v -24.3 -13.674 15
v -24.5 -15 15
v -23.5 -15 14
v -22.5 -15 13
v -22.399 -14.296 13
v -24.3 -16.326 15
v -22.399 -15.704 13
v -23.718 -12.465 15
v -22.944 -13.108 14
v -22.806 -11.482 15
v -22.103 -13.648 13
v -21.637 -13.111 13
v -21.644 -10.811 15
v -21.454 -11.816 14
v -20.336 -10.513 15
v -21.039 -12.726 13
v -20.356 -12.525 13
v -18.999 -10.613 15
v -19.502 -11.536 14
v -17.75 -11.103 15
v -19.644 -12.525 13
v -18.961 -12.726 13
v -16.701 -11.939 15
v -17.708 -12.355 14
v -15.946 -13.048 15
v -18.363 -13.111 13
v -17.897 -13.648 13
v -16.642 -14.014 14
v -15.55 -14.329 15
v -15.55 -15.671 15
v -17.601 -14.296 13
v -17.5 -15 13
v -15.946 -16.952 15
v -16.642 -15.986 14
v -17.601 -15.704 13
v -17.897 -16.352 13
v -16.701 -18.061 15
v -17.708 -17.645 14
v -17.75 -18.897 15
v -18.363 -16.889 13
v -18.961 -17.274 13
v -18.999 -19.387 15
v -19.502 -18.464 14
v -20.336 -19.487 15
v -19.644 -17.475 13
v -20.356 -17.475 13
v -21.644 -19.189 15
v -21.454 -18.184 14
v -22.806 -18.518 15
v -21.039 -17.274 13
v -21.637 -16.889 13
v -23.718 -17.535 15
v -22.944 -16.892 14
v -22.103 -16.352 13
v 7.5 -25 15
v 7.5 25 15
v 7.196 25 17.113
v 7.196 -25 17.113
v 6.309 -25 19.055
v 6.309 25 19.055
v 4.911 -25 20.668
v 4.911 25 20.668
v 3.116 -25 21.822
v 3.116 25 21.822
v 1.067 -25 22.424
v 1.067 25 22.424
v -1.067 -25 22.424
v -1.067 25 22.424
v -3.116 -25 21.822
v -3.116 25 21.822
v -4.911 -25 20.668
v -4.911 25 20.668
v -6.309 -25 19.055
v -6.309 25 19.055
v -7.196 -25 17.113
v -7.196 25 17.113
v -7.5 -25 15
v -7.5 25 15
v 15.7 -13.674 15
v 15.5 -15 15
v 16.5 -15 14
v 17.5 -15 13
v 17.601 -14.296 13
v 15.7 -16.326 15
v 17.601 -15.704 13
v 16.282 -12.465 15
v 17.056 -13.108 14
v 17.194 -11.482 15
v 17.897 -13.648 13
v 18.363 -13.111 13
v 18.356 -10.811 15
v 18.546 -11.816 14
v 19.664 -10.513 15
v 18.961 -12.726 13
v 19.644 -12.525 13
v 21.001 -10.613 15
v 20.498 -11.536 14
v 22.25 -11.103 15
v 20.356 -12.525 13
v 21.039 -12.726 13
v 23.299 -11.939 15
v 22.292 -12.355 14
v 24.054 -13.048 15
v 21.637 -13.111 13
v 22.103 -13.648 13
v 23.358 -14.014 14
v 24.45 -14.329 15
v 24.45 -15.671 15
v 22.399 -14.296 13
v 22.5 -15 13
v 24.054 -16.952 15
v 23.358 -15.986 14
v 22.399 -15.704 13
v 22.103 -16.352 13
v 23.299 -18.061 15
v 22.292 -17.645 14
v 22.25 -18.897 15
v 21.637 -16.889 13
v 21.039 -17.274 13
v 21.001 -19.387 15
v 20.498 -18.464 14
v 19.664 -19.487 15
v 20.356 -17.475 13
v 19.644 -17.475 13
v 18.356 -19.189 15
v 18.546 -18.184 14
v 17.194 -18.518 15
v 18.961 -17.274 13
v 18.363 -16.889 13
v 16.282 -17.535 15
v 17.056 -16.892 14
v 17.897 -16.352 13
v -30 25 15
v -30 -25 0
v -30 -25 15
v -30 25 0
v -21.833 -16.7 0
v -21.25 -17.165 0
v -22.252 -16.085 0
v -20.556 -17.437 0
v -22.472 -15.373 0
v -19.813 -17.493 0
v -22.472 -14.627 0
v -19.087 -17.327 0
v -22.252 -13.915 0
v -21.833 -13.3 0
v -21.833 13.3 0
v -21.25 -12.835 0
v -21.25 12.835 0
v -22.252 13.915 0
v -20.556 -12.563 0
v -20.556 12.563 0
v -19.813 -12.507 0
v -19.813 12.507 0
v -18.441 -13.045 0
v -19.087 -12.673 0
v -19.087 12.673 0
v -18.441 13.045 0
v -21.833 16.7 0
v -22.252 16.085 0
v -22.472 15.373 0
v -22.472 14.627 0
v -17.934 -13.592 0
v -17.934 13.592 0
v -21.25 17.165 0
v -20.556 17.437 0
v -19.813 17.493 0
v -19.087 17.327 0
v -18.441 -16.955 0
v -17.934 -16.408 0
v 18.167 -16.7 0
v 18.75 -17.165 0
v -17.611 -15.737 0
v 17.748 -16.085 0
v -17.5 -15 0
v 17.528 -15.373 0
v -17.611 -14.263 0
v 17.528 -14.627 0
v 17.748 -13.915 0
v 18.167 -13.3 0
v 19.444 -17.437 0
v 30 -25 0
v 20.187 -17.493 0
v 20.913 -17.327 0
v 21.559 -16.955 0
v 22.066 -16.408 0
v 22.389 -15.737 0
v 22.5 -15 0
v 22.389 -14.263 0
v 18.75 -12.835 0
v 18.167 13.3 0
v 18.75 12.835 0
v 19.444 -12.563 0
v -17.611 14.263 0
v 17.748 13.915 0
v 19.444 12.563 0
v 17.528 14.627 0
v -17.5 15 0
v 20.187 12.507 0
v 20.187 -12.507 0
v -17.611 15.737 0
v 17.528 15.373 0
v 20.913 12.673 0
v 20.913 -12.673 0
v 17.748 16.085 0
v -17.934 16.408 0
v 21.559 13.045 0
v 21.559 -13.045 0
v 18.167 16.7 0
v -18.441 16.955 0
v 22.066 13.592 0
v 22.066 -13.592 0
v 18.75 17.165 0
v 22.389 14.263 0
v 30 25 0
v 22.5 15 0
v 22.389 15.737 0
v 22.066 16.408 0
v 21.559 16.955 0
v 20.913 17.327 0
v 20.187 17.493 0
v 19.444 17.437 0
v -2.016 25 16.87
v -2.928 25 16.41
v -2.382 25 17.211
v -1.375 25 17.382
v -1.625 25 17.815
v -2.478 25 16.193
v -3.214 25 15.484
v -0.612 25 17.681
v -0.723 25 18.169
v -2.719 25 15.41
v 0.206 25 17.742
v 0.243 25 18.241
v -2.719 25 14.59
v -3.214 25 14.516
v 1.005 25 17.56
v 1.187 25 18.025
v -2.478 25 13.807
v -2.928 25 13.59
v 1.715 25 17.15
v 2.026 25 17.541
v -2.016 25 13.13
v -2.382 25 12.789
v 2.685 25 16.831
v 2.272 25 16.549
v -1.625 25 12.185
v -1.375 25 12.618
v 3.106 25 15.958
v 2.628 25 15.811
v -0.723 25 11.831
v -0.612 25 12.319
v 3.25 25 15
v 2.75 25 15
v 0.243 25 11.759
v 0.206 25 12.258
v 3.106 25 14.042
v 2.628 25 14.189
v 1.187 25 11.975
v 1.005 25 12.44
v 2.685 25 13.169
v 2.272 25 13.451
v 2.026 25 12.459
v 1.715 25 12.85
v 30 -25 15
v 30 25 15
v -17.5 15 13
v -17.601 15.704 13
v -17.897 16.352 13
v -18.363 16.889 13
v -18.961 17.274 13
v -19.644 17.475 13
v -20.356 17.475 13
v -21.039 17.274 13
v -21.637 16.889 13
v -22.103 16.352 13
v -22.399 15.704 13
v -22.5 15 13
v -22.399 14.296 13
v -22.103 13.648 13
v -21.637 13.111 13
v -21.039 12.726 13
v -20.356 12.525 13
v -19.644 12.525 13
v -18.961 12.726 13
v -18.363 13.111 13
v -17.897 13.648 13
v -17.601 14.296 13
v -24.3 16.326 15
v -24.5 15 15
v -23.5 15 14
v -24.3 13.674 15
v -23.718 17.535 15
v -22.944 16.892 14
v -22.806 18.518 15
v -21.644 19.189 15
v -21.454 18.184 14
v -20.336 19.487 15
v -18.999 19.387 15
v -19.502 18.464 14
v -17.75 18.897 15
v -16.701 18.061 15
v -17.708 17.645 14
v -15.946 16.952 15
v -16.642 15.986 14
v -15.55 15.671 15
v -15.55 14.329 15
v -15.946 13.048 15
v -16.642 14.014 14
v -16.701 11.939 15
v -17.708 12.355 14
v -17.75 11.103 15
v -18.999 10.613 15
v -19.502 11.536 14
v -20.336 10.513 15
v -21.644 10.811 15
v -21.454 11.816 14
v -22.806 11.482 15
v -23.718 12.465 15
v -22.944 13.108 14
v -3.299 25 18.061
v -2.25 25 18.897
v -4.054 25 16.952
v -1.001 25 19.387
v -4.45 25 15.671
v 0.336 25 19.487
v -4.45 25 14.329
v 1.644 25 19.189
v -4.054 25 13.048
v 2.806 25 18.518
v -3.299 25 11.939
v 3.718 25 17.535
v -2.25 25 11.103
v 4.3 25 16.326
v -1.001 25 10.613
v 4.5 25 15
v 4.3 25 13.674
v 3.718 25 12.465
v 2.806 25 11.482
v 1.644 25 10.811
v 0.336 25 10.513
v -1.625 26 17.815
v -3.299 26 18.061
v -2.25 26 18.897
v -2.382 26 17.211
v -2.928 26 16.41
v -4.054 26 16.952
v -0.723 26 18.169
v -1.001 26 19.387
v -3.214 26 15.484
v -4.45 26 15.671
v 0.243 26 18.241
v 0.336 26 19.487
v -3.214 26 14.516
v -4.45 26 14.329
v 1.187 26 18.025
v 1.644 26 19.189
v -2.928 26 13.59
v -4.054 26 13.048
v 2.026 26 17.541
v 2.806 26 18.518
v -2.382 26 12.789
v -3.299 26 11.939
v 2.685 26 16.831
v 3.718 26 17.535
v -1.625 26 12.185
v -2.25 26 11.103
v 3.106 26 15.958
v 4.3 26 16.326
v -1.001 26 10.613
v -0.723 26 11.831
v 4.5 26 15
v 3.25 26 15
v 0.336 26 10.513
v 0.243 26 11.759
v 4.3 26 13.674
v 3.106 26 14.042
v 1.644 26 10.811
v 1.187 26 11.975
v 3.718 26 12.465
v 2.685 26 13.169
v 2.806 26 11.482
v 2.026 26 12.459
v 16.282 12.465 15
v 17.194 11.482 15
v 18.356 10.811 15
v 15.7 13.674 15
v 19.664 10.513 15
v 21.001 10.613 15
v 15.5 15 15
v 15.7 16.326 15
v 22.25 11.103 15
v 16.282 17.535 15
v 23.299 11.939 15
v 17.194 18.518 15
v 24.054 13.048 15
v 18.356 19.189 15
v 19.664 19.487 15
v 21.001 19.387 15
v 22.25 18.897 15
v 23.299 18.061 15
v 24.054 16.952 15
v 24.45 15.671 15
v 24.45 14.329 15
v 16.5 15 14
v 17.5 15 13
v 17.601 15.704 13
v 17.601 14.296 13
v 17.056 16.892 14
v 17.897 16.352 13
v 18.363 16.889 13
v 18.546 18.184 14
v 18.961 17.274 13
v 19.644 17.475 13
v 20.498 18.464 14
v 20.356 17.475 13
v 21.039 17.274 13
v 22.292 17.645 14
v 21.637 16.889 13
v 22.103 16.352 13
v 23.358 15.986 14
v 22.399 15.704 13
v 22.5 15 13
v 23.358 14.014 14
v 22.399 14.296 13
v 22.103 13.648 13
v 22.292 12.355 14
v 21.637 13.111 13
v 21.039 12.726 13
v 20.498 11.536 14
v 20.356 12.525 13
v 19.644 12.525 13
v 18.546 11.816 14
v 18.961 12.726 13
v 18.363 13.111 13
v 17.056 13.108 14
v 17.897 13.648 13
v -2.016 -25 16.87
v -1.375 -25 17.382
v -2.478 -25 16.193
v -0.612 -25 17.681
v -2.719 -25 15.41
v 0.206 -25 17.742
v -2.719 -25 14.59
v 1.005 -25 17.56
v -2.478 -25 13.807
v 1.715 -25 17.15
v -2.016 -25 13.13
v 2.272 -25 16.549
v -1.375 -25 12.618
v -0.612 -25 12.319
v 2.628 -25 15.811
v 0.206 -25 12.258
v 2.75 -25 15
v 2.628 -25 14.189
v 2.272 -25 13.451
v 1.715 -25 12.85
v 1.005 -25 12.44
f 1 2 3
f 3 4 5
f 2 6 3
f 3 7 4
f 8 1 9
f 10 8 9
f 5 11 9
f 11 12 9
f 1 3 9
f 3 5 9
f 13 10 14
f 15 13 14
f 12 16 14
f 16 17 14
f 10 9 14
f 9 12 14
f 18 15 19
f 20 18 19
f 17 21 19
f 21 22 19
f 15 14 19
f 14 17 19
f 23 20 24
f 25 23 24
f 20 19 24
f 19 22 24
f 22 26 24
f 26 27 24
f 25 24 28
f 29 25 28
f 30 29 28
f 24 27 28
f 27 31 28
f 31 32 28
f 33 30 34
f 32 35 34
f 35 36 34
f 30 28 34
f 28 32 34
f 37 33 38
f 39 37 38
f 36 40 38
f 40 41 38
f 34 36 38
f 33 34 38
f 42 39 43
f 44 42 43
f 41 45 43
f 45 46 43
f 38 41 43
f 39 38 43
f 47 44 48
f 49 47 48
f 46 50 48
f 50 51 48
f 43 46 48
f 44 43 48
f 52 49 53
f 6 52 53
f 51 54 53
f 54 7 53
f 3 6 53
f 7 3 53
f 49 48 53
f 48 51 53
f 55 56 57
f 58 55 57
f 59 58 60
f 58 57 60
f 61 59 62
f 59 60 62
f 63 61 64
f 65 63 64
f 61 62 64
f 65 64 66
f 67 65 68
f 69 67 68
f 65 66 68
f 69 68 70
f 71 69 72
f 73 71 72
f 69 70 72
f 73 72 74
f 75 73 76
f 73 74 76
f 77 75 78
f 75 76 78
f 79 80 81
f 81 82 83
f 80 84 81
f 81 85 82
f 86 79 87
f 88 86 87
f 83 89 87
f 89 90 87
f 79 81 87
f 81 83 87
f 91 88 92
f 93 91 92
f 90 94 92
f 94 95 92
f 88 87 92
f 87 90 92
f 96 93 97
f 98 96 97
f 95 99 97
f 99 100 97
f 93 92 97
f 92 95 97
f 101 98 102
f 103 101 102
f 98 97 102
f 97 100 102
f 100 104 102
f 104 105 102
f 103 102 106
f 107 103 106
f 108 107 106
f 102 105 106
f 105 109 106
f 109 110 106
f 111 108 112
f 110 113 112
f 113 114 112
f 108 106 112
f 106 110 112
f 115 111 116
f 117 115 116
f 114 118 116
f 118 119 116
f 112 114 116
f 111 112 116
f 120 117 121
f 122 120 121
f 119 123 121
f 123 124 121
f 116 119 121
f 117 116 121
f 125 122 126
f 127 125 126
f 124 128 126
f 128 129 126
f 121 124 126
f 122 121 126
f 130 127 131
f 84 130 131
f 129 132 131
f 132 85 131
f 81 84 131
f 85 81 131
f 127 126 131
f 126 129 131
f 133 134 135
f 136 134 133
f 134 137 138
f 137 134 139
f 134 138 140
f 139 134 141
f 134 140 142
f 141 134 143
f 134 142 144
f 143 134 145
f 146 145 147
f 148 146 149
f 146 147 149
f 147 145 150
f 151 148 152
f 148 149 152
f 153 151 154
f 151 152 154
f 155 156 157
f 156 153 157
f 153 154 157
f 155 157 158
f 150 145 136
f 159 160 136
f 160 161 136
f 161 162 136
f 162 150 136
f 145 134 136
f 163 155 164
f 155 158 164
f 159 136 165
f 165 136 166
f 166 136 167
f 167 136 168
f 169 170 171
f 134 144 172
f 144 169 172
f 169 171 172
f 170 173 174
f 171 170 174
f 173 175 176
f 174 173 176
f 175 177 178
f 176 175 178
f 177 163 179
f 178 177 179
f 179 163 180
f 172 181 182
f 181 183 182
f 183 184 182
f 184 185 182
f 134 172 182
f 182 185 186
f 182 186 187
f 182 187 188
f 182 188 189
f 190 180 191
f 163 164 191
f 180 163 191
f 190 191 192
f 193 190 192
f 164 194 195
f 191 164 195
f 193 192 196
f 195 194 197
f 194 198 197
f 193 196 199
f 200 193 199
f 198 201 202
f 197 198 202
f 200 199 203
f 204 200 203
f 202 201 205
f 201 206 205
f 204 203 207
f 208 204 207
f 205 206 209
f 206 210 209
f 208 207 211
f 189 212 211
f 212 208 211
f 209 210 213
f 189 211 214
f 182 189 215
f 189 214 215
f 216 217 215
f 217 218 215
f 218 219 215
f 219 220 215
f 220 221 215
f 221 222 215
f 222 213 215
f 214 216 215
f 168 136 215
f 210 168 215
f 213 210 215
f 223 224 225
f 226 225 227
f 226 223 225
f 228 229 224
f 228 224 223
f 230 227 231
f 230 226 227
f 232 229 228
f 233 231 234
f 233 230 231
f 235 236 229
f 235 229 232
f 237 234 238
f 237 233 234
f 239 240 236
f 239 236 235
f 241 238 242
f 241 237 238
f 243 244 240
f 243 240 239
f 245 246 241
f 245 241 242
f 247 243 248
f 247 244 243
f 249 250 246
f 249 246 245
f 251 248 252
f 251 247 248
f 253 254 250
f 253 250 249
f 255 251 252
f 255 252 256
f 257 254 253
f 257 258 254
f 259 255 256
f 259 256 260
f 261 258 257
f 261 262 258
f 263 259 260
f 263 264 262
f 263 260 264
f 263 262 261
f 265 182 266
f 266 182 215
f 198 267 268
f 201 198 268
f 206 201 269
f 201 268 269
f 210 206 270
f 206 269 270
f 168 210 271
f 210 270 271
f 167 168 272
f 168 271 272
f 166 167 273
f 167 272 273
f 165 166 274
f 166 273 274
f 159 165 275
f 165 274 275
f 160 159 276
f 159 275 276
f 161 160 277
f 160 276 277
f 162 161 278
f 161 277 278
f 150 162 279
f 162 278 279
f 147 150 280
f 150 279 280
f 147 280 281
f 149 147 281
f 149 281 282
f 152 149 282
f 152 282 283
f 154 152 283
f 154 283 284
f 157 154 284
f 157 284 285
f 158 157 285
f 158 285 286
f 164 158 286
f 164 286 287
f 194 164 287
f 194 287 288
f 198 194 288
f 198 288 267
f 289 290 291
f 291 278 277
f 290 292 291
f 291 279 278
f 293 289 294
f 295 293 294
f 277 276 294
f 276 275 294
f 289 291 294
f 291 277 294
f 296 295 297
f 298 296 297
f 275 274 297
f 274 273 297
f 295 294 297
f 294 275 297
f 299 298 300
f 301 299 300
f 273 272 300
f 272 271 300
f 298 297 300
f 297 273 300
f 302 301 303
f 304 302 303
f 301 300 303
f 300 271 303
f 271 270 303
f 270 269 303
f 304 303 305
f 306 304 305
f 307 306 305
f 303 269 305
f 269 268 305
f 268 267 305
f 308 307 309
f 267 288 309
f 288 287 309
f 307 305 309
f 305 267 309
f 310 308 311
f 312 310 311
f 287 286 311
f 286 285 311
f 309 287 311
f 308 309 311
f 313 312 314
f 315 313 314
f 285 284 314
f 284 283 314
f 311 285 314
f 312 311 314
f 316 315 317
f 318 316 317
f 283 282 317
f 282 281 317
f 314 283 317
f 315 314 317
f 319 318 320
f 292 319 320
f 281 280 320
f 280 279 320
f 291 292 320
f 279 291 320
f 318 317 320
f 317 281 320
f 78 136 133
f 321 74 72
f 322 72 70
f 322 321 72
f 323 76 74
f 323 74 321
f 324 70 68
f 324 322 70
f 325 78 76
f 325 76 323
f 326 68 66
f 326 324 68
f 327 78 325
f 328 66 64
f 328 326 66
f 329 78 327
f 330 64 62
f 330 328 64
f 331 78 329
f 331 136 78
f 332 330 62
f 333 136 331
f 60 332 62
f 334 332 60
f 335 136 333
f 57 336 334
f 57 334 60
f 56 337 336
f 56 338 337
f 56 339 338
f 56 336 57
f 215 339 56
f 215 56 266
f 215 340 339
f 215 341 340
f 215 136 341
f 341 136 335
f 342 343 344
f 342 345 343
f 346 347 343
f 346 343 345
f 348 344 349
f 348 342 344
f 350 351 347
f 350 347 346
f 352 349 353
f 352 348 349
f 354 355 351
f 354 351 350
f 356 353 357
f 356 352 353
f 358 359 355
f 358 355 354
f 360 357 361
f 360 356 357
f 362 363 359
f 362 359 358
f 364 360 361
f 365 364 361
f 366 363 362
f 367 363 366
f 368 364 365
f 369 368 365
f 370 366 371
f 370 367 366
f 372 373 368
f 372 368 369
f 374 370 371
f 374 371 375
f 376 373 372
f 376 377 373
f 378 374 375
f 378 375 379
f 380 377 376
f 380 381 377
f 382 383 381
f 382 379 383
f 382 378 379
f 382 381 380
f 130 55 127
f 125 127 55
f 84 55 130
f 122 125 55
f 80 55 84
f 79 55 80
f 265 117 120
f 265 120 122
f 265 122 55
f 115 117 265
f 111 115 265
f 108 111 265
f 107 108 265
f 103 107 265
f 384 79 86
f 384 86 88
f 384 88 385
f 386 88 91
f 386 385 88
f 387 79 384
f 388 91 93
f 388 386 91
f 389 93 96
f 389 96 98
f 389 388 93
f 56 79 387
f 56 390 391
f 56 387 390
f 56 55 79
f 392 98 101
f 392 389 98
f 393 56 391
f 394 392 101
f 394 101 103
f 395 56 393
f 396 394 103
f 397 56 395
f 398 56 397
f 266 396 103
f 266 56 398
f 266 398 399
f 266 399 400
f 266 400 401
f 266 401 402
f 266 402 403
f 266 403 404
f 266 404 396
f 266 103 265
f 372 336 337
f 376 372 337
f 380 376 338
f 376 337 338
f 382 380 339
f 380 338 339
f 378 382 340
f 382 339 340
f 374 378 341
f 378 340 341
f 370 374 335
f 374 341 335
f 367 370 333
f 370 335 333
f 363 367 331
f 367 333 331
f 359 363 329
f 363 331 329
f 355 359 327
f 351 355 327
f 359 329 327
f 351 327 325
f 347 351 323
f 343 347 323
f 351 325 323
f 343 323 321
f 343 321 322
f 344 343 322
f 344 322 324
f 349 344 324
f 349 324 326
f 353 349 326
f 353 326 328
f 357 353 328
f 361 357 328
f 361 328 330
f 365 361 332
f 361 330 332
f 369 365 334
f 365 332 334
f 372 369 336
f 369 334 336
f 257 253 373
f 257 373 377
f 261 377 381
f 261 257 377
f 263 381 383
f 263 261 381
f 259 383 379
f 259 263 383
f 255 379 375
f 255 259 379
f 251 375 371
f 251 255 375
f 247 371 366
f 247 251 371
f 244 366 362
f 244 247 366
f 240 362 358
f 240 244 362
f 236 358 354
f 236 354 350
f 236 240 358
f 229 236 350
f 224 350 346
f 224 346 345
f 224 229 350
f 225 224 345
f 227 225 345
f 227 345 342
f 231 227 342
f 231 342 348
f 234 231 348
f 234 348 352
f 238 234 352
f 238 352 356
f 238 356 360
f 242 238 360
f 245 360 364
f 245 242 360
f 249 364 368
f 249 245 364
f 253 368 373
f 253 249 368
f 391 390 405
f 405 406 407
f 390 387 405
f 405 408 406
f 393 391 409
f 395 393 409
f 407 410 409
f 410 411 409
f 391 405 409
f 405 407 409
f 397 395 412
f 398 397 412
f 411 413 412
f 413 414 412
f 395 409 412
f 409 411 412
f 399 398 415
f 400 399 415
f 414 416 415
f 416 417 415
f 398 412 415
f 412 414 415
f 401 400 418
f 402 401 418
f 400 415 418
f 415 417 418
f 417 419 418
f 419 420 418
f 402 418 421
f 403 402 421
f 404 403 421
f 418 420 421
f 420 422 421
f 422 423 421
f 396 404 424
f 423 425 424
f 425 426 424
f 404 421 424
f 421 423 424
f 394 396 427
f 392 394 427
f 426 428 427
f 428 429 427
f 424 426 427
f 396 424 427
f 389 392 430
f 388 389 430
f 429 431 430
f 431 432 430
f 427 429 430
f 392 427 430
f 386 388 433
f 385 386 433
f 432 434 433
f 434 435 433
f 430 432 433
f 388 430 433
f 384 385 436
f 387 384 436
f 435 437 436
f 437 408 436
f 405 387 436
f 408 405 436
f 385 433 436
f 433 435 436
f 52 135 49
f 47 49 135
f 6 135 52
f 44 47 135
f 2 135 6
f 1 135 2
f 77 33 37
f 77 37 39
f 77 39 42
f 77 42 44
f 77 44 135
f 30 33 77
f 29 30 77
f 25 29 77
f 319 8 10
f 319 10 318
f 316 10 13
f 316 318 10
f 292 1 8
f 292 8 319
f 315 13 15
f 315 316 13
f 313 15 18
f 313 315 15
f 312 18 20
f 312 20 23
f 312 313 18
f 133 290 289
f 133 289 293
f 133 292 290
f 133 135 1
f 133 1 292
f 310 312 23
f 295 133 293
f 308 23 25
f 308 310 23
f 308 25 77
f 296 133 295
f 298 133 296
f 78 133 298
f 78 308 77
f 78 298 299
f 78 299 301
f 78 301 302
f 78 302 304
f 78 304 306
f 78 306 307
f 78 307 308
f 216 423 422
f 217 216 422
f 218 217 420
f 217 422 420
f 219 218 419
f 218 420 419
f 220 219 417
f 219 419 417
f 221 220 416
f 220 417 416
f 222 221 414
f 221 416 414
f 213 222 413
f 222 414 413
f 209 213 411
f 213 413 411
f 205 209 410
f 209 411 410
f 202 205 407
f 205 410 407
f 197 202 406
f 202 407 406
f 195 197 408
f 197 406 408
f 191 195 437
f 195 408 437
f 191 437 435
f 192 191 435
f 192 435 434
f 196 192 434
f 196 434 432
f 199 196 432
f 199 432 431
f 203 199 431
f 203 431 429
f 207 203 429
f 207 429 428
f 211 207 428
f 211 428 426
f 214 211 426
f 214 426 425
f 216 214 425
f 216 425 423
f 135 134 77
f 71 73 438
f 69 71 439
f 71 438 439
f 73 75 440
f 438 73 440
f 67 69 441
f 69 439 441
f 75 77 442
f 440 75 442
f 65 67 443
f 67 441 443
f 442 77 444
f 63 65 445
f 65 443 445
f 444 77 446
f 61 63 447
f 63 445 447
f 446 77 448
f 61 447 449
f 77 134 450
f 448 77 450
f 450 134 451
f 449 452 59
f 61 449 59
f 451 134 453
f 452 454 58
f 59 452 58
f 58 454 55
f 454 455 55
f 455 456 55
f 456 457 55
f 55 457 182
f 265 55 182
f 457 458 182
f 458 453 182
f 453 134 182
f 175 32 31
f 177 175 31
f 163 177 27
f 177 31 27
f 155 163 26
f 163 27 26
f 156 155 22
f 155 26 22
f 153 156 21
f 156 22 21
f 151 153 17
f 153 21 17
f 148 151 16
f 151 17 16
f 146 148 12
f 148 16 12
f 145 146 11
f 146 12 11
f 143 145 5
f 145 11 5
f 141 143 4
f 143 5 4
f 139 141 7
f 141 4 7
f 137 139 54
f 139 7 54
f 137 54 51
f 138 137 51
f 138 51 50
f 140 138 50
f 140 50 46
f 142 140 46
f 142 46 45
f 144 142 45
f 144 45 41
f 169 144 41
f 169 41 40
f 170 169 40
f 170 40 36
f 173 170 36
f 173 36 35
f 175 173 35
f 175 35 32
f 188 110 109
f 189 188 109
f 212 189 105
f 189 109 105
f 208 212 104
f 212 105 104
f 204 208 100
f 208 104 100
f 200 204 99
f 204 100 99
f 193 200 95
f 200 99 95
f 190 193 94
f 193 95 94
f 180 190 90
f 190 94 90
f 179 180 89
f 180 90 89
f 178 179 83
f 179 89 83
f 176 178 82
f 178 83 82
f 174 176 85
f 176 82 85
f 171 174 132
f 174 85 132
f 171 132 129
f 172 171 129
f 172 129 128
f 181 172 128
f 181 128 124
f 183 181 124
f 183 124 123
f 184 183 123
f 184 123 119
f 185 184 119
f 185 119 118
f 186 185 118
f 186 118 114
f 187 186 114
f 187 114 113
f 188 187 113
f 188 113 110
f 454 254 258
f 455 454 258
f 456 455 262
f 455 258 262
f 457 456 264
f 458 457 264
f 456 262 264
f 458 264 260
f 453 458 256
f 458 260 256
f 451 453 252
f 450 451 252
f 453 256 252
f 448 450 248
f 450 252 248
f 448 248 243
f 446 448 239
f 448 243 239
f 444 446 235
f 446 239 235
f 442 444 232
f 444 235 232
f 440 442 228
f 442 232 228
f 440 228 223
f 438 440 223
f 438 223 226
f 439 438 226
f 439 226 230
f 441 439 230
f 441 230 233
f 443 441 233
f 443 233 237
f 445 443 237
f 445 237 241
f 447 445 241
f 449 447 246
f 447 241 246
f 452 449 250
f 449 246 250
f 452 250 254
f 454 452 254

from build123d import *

# Parameters (mm, degrees)
ESQUISSE1_W                = 60
ESQUISSE1_H                = 50
BOSS_EXTRU_1_DEPTH         = 15
BOSS_EXTRU_2_DEPTH         = 50
ESQUISSE3_R                = 4.5
ESQUISSE3_R_2              = 3.25
BOSS_EXTRU_3_DEPTH         = 1
ESQUISSE4_R                = 2.75
ENL_V_MAT_EXTRU_1_DEPTH    = 50
ESQUISSE5_R                = 2.5
ENL_V_MAT_EXTRU_2_DEPTH    = 15
R_P_TITION_LIN_AIRE1_COUNT = 2
R_P_TITION_LIN_AIRE1_PITCH = 30
R_P_TITION_LIN_AIRE2_COUNT = 2
R_P_TITION_LIN_AIRE2_PITCH = 40


with BuildPart() as part:
    # Esquisse1 → Boss.-Extru.1 (new body)
    with BuildSketch(Plane.XY):
        Rectangle(ESQUISSE1_W, ESQUISSE1_H)
    extrude(amount=BOSS_EXTRU_1_DEPTH)

    # Esquisse2 → Boss.-Extru.2 (add)
    with BuildSketch(Plane(origin=(0, 25, 0), x_dir=(1, 0, 0), z_dir=(0, 1, 0))):
        with BuildLine():
            Line((-7.5, -15), (7.5, -15))
            ThreePointArc((7.5, -15), (0, -22.5), (-7.5, -15))
        make_face()
    extrude(amount=-BOSS_EXTRU_2_DEPTH)

    # Esquisse3 → Boss.-Extru.3 (add)
    with BuildSketch(Plane(origin=(0, 25, 0), x_dir=(1, 0, 0), z_dir=(0, 1, 0))):
        with Locations((0, -15)):
            Circle(ESQUISSE3_R)
        with Locations((0, -15)):
            Circle(ESQUISSE3_R_2, mode=Mode.SUBTRACT)
    extrude(amount=BOSS_EXTRU_3_DEPTH)

    # Esquisse4 → Enlèv. mat.-Extru.1 (cut)
    with BuildSketch(Plane(origin=(0, 25, 0), x_dir=(1, 0, 0), z_dir=(0, 1, 0))):
        with Locations((0, -15)):
            Circle(ESQUISSE4_R)
    extrude(amount=-ENL_V_MAT_EXTRU_1_DEPTH, mode=Mode.SUBTRACT)

    # Esquisse5 → Enlèv. mat.-Extru.2 (cut)
    with BuildSketch(Plane.XY.offset(15)):
        with Locations((-20, -15)):
            Circle(ESQUISSE5_R)
        with Locations((-20, 15)):
            Circle(ESQUISSE5_R)
        with Locations((20, -15)):
            Circle(ESQUISSE5_R)
        with Locations((20, 15)):
            Circle(ESQUISSE5_R)
    extrude(amount=-ENL_V_MAT_EXTRU_2_DEPTH, mode=Mode.SUBTRACT)

    # Esquisse13 → Enlèvement de matière-Révolution1 (revolve, cut)
    with BuildSketch(Plane.XZ.offset(15)):
        Polygon((-24.5, 15), (-22.5, 13), (-22.5, 15), align=None)
    enl_vement_de_mati_re_r_volution1 = revolve(axis=Axis((-20, -15, 15), (0, 0, -1)), mode=Mode.SUBTRACT)

    # Répétition linéaire1: Enlèvement de matière-Révolution1 ×2
    with Locations(*[(0, i * R_P_TITION_LIN_AIRE1_PITCH, 0) for i in range(1, R_P_TITION_LIN_AIRE1_COUNT)]):
        add(enl_vement_de_mati_re_r_volution1, mode=Mode.SUBTRACT)

    # Répétition linéaire2: Enlèvement de matière-Révolution1 ×2
    with Locations(*[(i * R_P_TITION_LIN_AIRE2_PITCH, 0, 0) for i in range(1, R_P_TITION_LIN_AIRE2_COUNT)]):
        add(enl_vement_de_mati_re_r_volution1, mode=Mode.SUBTRACT)

    # Répétition linéaire2 copy 1 sketch → Répétition linéaire2 copy 1 (revolve, cut)
    with BuildSketch(Plane(origin=(40, 15, 0), x_dir=(1, 0, 0), z_dir=(0, -1, 0))):
        Polygon((-24.5, 15), (-22.5, 13), (-22.5, 15), align=None)
    revolve(axis=Axis((20, 15, 15), (0, 0, -1)), mode=Mode.SUBTRACT)


solid = part.part
